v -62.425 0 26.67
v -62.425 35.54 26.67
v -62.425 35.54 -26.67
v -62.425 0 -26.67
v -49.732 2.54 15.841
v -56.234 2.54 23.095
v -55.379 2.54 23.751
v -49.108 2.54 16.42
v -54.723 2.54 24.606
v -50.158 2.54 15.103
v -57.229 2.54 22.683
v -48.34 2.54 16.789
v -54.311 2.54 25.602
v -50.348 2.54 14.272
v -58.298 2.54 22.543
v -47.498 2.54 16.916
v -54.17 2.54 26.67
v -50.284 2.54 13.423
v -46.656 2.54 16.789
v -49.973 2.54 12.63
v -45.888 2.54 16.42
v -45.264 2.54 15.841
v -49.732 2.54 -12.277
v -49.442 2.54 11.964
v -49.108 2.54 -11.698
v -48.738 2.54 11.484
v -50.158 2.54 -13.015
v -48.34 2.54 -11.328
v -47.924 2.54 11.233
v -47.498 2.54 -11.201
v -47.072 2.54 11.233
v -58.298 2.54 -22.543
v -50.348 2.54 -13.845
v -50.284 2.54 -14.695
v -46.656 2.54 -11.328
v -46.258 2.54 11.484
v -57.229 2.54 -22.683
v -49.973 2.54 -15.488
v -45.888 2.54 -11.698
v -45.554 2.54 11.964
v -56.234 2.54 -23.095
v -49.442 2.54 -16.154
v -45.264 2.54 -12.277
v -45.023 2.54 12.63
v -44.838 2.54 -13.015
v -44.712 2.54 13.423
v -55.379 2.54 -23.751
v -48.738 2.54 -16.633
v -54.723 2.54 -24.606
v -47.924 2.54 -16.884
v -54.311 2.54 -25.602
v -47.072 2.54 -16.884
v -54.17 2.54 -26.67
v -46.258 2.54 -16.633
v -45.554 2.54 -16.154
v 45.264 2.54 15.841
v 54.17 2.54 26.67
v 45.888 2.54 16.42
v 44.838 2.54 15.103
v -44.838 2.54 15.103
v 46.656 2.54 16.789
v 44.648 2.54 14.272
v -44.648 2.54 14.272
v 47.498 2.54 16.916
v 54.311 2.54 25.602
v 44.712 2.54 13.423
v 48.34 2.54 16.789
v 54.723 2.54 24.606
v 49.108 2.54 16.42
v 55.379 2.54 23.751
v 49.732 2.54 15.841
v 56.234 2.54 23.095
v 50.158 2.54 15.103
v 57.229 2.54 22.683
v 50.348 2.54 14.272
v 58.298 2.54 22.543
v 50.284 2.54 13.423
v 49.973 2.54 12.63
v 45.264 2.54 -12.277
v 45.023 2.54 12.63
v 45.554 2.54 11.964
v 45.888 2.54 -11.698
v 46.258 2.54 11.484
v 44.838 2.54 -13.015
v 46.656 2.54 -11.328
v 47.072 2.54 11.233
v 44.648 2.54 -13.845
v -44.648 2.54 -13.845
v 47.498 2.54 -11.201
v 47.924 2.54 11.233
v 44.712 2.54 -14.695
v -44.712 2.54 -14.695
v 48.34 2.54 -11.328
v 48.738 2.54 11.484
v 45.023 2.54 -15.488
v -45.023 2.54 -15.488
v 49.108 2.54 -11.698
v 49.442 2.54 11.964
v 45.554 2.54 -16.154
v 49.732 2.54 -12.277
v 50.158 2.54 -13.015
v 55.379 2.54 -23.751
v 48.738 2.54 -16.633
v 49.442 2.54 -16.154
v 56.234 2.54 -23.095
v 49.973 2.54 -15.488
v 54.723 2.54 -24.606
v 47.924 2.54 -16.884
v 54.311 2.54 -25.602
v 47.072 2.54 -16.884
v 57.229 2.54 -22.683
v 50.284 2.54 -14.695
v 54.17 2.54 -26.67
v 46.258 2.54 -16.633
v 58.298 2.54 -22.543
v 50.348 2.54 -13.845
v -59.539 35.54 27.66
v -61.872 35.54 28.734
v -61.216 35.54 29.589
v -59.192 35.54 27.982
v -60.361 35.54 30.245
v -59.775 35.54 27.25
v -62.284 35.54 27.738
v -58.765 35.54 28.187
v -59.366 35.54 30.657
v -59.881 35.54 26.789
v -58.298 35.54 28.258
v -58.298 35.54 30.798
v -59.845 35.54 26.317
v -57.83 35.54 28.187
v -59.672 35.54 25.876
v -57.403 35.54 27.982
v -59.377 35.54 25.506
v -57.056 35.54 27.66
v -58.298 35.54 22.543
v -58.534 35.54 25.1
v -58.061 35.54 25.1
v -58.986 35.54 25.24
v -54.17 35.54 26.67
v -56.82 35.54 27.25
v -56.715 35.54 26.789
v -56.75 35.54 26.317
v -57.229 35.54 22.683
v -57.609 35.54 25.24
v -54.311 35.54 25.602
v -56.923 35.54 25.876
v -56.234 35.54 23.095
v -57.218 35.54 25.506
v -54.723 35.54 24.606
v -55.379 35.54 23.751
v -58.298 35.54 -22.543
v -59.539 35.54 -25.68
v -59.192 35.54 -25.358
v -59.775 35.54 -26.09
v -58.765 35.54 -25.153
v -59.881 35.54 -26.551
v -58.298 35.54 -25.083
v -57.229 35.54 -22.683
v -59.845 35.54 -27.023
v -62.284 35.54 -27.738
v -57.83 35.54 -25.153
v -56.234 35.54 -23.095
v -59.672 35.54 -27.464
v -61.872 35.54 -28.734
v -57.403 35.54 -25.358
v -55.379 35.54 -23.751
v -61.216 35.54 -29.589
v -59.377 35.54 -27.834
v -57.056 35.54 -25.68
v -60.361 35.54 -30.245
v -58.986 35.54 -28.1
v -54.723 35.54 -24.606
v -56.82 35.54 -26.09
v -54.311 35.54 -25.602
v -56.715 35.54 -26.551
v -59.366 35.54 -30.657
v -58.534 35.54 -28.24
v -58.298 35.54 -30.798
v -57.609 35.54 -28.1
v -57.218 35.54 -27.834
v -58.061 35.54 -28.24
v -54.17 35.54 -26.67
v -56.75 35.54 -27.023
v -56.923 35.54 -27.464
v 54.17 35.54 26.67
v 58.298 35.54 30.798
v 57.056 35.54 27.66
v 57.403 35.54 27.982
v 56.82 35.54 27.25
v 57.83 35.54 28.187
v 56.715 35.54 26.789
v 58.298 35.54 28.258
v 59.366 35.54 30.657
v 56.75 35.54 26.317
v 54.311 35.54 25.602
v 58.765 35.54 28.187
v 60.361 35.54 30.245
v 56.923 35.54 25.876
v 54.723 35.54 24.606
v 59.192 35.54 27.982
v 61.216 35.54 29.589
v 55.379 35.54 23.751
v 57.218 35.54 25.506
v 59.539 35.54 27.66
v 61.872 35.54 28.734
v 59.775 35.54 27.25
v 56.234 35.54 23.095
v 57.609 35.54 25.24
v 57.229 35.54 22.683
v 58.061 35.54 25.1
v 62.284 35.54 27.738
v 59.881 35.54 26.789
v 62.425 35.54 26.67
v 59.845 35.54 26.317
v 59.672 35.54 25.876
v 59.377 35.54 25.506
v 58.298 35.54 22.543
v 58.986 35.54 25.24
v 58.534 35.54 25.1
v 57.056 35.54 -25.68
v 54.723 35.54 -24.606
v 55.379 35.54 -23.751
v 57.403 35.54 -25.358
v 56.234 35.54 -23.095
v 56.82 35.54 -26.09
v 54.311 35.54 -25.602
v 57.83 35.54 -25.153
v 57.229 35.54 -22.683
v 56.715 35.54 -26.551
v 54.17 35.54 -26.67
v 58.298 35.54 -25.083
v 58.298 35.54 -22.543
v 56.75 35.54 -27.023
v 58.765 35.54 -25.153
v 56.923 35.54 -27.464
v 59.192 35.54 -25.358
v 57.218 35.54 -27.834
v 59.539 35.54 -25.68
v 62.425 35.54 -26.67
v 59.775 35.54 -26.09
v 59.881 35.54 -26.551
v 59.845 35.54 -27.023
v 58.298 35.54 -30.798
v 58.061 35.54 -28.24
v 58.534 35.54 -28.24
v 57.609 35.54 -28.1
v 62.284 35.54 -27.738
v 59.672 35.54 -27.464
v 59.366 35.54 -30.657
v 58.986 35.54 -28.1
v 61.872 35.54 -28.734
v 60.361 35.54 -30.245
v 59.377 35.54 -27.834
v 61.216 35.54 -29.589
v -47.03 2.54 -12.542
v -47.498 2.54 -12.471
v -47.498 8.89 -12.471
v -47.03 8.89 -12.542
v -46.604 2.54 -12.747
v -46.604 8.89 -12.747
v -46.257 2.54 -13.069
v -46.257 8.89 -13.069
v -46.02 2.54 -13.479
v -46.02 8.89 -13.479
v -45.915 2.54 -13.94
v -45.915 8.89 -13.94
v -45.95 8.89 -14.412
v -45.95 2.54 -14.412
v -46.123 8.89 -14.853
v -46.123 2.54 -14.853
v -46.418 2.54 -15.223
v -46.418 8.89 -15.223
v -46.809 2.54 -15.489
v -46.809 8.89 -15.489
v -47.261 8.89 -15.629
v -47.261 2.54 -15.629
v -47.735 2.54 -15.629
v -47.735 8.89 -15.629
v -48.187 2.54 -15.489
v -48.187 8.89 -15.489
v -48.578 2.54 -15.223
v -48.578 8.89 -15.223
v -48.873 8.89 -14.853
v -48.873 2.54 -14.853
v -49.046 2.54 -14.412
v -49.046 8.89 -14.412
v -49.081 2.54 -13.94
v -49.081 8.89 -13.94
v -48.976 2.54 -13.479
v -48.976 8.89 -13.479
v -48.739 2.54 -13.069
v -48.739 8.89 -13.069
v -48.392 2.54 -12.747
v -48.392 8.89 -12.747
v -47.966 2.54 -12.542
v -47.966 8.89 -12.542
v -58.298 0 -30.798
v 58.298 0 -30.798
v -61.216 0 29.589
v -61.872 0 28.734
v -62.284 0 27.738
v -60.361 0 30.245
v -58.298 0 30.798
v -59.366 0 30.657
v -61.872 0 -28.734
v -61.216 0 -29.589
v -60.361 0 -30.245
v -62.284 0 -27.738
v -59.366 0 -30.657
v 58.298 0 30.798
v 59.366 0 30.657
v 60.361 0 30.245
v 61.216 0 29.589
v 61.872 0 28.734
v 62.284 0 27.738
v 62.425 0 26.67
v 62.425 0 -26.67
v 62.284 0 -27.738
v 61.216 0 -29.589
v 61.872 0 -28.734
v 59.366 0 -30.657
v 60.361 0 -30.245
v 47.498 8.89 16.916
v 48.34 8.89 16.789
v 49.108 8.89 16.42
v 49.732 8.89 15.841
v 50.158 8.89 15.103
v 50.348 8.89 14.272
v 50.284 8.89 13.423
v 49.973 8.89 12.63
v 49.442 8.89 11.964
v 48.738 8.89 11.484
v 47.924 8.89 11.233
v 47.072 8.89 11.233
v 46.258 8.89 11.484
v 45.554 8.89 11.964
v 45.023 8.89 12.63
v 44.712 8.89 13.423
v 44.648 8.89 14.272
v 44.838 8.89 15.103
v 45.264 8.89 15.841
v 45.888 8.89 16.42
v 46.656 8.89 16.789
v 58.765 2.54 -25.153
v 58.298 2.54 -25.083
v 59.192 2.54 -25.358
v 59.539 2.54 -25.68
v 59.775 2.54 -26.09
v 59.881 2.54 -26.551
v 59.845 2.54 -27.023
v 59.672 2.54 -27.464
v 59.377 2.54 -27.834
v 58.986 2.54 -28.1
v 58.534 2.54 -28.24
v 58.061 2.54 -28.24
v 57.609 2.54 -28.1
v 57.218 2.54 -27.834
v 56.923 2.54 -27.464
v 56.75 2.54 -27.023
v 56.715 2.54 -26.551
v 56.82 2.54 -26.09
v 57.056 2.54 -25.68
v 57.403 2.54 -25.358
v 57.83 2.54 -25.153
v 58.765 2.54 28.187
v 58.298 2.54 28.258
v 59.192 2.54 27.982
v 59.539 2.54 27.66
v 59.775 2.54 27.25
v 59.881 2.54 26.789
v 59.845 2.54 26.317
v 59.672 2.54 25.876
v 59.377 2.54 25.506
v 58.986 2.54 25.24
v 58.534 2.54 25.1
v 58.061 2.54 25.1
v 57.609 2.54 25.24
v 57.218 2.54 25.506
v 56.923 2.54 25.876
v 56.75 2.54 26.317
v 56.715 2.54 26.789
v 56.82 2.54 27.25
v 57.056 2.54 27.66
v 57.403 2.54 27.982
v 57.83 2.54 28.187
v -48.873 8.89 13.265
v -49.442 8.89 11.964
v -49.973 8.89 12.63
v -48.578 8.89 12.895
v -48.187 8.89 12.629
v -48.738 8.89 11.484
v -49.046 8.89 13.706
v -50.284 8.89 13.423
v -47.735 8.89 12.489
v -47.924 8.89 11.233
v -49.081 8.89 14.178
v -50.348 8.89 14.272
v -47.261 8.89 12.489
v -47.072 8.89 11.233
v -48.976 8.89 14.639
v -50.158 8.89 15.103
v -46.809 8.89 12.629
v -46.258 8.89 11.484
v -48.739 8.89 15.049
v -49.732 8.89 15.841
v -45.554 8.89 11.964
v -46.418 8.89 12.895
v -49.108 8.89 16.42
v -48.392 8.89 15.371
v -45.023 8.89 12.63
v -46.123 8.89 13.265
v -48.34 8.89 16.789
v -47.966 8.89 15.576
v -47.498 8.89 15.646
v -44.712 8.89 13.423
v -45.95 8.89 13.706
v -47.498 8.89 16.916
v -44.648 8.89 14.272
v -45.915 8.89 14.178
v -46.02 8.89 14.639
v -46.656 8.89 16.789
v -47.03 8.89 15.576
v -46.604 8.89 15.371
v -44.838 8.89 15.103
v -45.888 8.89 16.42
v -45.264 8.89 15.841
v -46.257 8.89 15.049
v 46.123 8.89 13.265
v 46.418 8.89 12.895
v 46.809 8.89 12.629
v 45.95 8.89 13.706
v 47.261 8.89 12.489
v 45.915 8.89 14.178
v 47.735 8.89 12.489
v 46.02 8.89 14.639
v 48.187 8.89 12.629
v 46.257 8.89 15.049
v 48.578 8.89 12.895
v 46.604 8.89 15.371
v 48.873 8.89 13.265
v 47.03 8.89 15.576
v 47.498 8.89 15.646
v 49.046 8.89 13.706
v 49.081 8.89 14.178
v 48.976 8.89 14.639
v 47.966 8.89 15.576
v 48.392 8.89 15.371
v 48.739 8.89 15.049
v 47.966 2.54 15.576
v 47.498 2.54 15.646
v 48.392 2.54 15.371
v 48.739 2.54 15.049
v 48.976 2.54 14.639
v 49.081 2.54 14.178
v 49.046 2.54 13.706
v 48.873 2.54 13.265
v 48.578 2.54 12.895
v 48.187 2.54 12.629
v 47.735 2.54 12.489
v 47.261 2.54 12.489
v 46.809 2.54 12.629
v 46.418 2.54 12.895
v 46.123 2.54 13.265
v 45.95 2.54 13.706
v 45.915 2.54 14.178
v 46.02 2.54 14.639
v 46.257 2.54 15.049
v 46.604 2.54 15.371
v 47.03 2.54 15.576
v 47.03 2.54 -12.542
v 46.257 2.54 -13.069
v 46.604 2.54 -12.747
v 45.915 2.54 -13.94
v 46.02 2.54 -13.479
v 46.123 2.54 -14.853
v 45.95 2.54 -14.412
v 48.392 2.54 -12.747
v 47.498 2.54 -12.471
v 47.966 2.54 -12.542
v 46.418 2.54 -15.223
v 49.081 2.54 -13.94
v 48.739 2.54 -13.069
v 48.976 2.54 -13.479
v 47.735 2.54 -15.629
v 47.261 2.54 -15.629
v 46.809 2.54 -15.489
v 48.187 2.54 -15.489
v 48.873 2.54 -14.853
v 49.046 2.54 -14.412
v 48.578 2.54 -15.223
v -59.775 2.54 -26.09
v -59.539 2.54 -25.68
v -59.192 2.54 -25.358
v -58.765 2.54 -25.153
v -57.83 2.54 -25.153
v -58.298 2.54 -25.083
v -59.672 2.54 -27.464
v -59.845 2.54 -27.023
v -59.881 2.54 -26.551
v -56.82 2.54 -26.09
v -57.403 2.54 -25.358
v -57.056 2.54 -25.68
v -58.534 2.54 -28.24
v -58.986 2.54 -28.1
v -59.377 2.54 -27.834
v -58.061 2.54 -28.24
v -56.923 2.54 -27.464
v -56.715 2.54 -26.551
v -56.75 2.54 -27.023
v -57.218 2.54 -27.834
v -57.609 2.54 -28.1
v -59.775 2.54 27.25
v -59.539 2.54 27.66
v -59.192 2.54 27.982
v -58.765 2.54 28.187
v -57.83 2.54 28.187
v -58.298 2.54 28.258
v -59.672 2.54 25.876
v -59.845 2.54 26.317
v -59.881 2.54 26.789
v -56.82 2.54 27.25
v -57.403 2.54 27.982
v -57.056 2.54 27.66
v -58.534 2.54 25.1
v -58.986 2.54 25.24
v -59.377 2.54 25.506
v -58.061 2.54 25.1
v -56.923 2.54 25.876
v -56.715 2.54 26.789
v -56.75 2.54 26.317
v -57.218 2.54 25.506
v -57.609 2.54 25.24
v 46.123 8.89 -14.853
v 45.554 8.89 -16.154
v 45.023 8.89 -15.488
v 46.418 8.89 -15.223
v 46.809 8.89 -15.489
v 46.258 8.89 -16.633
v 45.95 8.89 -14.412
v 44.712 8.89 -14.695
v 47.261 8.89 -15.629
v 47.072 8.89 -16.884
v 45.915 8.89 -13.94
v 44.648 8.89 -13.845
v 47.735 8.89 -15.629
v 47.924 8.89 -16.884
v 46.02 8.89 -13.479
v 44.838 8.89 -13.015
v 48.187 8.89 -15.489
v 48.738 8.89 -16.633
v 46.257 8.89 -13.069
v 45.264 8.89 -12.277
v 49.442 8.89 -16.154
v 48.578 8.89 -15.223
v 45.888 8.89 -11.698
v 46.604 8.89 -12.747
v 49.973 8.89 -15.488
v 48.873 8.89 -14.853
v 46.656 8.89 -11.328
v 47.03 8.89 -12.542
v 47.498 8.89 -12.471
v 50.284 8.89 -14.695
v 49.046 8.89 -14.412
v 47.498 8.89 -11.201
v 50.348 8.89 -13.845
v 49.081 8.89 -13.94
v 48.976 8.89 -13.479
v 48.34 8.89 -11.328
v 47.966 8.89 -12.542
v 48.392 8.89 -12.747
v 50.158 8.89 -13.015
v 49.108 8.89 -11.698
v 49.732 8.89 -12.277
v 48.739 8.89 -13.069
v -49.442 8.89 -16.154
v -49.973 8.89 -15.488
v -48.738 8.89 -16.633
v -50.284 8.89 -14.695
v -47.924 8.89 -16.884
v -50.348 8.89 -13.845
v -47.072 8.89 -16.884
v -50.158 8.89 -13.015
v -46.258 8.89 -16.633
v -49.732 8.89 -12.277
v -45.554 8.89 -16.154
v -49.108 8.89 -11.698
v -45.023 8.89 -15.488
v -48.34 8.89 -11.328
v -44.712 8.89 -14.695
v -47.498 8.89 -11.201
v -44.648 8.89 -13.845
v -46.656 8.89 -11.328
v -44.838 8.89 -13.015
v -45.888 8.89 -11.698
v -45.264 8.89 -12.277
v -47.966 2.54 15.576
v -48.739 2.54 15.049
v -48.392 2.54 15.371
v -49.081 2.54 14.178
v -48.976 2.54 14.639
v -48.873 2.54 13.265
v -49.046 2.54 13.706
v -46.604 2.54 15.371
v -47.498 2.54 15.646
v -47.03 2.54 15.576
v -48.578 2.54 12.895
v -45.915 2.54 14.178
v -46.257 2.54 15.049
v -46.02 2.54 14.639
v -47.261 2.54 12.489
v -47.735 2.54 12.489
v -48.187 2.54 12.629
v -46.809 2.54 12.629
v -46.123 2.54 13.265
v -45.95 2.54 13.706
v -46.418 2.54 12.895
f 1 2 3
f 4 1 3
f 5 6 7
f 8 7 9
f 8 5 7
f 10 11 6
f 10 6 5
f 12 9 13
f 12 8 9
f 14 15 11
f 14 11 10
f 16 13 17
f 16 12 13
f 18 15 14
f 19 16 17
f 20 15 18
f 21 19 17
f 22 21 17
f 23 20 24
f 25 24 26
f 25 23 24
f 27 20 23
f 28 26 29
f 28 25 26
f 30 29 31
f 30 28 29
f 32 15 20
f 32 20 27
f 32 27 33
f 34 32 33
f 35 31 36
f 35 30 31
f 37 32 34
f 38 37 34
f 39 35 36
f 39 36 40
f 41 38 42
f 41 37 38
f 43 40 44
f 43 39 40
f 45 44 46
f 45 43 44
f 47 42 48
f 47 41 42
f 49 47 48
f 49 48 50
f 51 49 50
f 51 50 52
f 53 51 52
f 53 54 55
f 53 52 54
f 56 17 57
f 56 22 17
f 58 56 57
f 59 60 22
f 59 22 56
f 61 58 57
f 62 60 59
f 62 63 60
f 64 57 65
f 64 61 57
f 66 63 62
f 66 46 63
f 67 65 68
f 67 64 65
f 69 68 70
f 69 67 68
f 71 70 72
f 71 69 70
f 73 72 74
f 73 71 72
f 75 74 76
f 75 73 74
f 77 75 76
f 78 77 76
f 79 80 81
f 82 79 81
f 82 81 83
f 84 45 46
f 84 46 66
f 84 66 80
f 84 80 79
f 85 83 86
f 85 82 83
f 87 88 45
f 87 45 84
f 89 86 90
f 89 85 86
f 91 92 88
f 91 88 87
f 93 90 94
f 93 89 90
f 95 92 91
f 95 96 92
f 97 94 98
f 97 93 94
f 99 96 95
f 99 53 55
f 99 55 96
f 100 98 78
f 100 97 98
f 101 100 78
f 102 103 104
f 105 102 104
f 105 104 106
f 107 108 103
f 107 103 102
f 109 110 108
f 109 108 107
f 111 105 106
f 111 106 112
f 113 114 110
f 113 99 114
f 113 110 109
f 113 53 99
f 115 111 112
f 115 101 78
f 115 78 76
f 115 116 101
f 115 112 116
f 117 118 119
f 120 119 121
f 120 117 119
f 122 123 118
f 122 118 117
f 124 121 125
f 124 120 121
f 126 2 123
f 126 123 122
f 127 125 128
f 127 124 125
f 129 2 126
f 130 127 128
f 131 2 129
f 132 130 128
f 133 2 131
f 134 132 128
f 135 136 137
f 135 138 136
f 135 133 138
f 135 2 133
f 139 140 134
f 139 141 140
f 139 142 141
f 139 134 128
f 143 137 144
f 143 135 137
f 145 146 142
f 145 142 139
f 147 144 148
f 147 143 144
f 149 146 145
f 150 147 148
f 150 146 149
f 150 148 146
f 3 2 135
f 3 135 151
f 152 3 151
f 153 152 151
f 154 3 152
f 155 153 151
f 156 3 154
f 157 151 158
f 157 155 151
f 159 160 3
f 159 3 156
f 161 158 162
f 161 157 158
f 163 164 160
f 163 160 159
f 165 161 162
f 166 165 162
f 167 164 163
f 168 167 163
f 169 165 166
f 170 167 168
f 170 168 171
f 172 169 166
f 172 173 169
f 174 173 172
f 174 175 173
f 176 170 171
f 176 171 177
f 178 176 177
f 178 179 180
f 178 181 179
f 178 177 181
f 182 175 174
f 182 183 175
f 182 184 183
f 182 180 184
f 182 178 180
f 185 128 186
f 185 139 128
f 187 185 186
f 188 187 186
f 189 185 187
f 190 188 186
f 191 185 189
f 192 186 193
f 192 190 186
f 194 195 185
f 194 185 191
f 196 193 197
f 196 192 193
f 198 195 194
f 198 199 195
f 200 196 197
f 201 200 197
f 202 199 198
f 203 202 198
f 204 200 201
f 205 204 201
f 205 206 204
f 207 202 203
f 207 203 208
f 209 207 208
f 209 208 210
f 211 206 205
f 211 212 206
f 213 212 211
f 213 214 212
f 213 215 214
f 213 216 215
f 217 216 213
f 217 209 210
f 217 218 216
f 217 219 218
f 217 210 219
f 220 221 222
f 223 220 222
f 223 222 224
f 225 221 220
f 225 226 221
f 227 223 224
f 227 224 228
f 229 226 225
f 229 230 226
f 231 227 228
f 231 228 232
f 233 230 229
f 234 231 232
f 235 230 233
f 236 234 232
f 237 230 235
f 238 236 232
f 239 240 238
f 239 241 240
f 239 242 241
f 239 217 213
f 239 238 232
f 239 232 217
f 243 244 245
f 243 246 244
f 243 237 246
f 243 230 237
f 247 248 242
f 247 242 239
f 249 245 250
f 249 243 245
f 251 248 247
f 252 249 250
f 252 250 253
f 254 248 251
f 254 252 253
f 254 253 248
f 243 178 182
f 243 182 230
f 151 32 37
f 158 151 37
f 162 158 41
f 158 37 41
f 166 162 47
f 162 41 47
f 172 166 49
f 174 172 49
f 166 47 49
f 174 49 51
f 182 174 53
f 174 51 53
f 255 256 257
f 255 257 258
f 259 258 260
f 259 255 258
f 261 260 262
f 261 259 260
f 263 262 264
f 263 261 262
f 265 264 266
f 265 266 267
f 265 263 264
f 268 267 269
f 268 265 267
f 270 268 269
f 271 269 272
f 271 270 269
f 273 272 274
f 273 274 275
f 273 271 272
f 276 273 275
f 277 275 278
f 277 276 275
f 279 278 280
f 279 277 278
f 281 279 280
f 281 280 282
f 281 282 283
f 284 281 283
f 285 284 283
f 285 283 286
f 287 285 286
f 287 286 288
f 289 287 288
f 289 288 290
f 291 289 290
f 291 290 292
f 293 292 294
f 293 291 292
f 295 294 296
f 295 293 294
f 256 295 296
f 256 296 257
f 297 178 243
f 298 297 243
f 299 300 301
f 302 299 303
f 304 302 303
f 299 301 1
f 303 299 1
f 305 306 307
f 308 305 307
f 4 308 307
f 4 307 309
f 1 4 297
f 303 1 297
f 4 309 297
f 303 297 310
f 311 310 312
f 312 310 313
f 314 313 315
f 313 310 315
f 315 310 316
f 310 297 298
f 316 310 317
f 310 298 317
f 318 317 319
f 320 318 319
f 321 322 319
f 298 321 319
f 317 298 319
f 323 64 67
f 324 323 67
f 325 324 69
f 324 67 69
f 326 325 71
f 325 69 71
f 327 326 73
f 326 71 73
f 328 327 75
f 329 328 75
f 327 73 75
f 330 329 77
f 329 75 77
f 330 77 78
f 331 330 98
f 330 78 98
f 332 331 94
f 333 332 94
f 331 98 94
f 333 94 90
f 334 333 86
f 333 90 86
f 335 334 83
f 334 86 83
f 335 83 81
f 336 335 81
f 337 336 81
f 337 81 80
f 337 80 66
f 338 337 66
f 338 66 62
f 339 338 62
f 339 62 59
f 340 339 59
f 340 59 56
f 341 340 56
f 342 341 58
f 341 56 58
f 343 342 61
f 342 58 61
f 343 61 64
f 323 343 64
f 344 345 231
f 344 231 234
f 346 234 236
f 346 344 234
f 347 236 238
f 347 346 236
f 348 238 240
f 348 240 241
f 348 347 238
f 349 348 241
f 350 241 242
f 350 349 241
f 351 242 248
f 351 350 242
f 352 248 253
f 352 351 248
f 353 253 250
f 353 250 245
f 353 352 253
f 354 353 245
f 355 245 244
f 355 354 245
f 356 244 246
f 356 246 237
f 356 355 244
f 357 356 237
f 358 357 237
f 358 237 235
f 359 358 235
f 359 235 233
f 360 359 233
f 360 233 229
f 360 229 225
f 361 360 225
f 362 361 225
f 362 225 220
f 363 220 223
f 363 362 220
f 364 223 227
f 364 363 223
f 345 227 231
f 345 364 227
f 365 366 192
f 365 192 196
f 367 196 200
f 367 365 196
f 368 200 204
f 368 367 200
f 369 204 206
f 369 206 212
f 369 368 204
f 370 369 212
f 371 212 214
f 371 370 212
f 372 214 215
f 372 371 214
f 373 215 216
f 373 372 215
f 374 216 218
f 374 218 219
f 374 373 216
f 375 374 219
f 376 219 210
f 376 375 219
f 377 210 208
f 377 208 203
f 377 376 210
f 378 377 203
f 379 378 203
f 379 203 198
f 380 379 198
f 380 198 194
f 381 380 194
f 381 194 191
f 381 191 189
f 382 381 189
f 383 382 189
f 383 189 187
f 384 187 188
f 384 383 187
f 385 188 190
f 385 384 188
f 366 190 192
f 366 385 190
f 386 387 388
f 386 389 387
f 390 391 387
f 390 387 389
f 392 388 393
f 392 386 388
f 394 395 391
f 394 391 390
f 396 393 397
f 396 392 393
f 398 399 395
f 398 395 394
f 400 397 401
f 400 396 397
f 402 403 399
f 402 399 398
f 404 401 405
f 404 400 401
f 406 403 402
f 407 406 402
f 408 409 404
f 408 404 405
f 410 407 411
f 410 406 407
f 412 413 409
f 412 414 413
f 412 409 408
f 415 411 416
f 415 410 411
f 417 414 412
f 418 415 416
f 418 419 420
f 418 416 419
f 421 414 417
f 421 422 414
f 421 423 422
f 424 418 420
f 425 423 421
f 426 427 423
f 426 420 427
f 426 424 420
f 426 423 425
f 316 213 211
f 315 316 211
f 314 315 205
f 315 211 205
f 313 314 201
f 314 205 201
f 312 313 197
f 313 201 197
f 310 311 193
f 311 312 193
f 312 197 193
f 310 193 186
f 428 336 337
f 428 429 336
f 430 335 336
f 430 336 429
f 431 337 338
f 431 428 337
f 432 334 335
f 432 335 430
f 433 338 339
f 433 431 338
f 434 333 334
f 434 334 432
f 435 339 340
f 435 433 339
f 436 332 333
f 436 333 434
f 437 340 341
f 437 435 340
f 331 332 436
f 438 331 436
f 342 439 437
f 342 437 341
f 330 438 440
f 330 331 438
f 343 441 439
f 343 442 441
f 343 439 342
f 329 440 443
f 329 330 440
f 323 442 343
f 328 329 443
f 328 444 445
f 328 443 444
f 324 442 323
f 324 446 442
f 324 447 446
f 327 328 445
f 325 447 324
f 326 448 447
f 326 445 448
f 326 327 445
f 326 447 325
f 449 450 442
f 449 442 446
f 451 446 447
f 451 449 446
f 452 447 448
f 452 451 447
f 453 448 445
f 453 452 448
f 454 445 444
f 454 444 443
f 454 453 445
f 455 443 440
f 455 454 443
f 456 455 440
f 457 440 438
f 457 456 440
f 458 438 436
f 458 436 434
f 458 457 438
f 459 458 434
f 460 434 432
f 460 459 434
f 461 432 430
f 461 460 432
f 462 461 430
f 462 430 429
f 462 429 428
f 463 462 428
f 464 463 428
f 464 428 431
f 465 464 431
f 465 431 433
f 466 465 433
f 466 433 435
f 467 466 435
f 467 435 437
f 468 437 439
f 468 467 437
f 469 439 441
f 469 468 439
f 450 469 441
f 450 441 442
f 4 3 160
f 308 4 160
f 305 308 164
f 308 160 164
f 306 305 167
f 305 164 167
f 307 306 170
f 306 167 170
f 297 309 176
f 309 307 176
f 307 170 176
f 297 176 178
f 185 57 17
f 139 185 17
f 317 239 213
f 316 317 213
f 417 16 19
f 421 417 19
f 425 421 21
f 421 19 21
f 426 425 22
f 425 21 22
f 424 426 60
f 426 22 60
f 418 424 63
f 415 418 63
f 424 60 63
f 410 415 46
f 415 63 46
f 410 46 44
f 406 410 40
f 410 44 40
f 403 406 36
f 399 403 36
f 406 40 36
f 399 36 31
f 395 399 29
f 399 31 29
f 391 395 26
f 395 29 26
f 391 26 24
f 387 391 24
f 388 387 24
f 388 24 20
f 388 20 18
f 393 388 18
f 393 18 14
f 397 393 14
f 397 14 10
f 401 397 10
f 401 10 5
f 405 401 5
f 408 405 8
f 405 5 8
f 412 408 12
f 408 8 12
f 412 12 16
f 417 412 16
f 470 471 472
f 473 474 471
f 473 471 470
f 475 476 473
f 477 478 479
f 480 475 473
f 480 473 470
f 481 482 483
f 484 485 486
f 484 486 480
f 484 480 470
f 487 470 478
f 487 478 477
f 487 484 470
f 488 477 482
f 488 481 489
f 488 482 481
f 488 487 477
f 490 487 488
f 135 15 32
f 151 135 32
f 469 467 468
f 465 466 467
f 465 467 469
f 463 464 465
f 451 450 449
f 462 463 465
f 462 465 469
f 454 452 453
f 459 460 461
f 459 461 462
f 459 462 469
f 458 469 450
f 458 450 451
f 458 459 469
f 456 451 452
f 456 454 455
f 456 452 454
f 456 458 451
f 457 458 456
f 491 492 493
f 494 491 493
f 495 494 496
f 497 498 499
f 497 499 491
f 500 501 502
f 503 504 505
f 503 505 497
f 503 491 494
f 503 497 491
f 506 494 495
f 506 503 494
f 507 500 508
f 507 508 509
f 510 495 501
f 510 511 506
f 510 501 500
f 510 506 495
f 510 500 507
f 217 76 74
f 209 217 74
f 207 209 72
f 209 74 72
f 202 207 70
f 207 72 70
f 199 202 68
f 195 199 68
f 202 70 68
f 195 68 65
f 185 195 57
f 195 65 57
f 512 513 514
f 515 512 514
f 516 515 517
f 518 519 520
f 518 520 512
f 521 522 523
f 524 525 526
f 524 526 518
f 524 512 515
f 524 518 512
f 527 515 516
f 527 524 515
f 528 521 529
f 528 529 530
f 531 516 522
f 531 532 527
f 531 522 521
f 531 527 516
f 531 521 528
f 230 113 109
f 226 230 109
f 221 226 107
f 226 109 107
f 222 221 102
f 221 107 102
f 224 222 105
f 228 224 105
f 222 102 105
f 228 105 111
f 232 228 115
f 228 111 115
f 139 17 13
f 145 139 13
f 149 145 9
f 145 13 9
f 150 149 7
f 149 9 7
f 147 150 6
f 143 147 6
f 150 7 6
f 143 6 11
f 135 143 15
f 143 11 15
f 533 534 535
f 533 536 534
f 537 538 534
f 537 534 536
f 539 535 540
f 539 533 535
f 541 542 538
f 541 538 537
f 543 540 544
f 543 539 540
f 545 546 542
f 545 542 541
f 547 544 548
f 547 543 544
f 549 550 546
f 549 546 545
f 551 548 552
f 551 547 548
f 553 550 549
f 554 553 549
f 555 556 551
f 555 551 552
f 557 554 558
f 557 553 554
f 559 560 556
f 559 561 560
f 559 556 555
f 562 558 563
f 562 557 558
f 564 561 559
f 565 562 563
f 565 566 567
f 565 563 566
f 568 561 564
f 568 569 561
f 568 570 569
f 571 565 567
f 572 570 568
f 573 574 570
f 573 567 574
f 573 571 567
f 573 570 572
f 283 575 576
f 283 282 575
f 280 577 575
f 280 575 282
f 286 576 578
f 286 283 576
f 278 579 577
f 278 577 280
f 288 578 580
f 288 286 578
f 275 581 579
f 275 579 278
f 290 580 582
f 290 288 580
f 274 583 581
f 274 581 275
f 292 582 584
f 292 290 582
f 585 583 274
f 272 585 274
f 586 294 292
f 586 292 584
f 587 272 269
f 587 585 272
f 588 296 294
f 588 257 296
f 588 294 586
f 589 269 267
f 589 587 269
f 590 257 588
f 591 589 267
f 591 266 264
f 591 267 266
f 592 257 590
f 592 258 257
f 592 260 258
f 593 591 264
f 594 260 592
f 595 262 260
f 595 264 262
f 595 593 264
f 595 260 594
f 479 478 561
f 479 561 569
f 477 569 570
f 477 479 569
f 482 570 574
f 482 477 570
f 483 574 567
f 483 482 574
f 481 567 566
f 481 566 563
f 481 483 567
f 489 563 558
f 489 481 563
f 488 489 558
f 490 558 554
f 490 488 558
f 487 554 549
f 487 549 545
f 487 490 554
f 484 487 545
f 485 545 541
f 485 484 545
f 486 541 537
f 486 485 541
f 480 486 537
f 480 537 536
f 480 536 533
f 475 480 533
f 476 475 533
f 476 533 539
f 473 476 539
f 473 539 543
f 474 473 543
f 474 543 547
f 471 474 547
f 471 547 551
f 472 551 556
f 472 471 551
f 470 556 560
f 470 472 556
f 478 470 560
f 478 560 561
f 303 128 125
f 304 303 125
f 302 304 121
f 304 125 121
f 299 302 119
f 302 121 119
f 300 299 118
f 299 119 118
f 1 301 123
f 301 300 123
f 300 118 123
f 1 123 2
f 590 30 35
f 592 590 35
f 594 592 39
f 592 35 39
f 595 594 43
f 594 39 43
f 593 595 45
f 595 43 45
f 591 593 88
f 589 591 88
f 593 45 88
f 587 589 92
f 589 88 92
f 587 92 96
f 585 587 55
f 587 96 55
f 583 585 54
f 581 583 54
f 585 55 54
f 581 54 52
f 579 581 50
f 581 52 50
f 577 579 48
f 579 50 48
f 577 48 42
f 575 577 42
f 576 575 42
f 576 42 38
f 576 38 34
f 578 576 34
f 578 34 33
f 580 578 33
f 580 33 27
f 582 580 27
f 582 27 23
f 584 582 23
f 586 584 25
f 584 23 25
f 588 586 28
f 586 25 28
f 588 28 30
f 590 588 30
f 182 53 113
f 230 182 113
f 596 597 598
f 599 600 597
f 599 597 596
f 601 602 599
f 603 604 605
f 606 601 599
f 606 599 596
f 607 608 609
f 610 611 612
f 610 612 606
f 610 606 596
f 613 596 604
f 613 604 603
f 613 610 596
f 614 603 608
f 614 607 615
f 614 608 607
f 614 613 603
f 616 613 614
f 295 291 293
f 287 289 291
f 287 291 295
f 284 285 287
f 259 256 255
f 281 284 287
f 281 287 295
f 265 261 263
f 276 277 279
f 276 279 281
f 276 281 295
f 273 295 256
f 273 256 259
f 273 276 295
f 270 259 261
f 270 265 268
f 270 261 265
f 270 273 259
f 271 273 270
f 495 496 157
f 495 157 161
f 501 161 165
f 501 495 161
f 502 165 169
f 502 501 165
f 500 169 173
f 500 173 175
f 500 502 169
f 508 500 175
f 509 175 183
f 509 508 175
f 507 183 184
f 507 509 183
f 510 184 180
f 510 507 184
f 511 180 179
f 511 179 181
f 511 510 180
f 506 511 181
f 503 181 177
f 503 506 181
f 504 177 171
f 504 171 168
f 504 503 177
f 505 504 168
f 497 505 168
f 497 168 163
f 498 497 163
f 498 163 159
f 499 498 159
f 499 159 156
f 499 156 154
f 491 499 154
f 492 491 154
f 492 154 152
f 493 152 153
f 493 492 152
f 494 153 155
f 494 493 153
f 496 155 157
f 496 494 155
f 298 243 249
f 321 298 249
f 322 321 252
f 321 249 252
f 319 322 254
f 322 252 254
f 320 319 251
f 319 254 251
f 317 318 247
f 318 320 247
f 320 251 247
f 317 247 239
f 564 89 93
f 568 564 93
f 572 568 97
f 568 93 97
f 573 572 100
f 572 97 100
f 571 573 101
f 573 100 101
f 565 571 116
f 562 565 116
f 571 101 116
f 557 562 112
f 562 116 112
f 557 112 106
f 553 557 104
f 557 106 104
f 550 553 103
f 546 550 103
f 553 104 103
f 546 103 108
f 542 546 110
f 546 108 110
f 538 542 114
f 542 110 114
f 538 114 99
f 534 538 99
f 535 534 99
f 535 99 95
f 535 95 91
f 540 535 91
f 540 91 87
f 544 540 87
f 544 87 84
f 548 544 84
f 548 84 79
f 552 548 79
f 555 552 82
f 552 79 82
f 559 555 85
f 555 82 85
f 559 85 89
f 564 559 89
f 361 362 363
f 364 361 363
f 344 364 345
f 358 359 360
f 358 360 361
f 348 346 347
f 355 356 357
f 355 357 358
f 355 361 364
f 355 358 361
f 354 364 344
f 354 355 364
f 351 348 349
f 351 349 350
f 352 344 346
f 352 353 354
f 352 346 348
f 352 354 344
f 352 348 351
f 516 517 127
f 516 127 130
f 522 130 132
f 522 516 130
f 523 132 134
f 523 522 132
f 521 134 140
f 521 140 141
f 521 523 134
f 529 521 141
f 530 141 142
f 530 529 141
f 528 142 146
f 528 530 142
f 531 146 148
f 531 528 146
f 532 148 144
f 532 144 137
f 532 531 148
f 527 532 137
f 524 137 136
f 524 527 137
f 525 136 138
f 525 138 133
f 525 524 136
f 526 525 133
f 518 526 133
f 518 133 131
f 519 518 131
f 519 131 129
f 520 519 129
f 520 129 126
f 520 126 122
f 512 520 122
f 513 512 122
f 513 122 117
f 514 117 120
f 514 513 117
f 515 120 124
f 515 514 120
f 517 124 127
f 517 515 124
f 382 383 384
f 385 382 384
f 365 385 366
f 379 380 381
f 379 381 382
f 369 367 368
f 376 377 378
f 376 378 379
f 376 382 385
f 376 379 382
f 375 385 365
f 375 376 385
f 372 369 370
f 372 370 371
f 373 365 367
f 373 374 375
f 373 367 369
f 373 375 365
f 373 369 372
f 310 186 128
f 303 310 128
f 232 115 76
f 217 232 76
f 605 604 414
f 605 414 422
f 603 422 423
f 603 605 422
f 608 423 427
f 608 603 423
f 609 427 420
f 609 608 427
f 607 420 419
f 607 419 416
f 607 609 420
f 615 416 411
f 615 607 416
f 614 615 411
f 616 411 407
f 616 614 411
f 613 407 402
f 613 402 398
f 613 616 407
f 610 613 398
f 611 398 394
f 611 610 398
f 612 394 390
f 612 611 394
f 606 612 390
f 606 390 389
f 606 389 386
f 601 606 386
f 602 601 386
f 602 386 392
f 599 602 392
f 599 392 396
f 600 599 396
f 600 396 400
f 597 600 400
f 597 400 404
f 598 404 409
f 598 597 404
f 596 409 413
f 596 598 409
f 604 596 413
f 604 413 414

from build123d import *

# Parameters (mm, degrees)
SKETCH1_W           = 126.755144
SKETCH1_H           = 63.5
BOSS_EXTRUDE1_DEPTH = 2.54
SKETCH2_R           = 1.5875
BOSS_EXTRUDE2_DEPTH = 33
SKETCH2_4_W         = 126.755144
SKETCH2_4_H         = 63.5
CUT_EXTRUDE1_DEPTH  = 79.190658858
SKETCH4_R           = 2.8575
SKETCH4_R_2         = 1.5875
BOSS_EXTRUDE3_DEPTH = 6.35


with BuildPart() as part:
    # Sketch1 → Boss-Extrude1 (new body)
    with BuildSketch(Plane(origin=(0, 0, 0), x_dir=(1, 0, 0), z_dir=(0, 1, 0))):
        Rectangle(SKETCH1_W, SKETCH1_H)
    extrude(amount=BOSS_EXTRUDE1_DEPTH)

    # Sketch2 → Boss-Extrude2 (add)
    with BuildSketch(Plane(origin=(0, 2.54, 0), x_dir=(1, 0, 0), z_dir=(0, 1, 0))):
        with BuildLine():
            ThreePointArc((62.425072, 26.67), (61.216155239, 29.588583239), (58.297572, 30.7975))
            Line((58.297572, 30.7975), (-58.297572, 30.7975))
            ThreePointArc((-58.297572, 30.7975), (-61.216155239, 29.588583239), (-62.425072, 26.67))
            Line((-62.425072, 26.67), (-62.425072, -26.67))
            ThreePointArc((-62.425072, -26.67), (-61.216155239, -29.588583239), (-58.297572, -30.7975))
            Line((-58.297572, -30.7975), (58.297572, -30.7975))
            ThreePointArc((58.297572, -30.7975), (61.216155239, -29.588583239), (62.425072, -26.67))
            Line((62.425072, -26.67), (62.425072, 26.67))
        make_face()
        with Locations((58.297572, 26.67)):
            Circle(SKETCH2_R, mode=Mode.SUBTRACT)
        with BuildLine():
            ThreePointArc((54.170072, 26.67), (55.378988761, 23.751416761), (58.297572, 22.5425))
            Line((58.297572, 22.5425), (58.297572, -22.5425))
            ThreePointArc((58.297572, -22.5425), (55.378988761, -23.751416761), (54.170072, -26.67))
            Line((54.170072, -26.67), (-54.170072, -26.67))
            ThreePointArc((-54.170072, -26.67), (-55.378988761, -23.751416761), (-58.297572, -22.5425))
            Line((-58.297572, -22.5425), (-58.297572, 22.5425))
            ThreePointArc((-58.297572, 22.5425), (-55.378988761, 23.751416761), (-54.170072, 26.67))
            Line((-54.170072, 26.67), (54.170072, 26.67))
        make_face(mode=Mode.SUBTRACT)
        with Locations((-58.297572, 26.67)):
            Circle(SKETCH2_R, mode=Mode.SUBTRACT)
        with Locations((58.297572, -26.67)):
            Circle(SKETCH2_R, mode=Mode.SUBTRACT)
        with Locations((-58.297572, -26.67)):
            Circle(SKETCH2_R, mode=Mode.SUBTRACT)
    extrude(amount=BOSS_EXTRUDE2_DEPTH)

    # Sketch2<4> → Cut-Extrude1 (cut, through all)
    with BuildSketch(Plane(origin=(0, 2.54, 0), x_dir=(1, 0, 0), z_dir=(0, 1, 0))):
        Rectangle(SKETCH2_4_W, SKETCH2_4_H)
        with BuildLine():
            ThreePointArc((58.297572, 30.7975), (61.216155239, 29.588583239), (62.425072, 26.67))
            Line((62.425072, 26.67), (62.425072, -26.67))
            ThreePointArc((62.425072, -26.67), (61.216155239, -29.588583239), (58.297572, -30.7975))
            Line((58.297572, -30.7975), (-58.297572, -30.7975))
            ThreePointArc((-58.297572, -30.7975), (-61.216155239, -29.588583239), (-62.425072, -26.67))
            Line((-62.425072, -26.67), (-62.425072, 26.67))
            ThreePointArc((-62.425072, 26.67), (-61.216155239, 29.588583239), (-58.297572, 30.7975))
            Line((-58.297572, 30.7975), (58.297572, 30.7975))
        make_face(mode=Mode.SUBTRACT)
    extrude(amount=-CUT_EXTRUDE1_DEPTH, mode=Mode.SUBTRACT)

    # Sketch4 → Boss-Extrude3 (add)
    # profile 1 of 4: a face of its own
    with BuildSketch(Plane(origin=(0, 2.54, 0), x_dir=(1, 0, 0), z_dir=(0, 1, 0))):
        with Locations((-47.498, 14.0589)):
            Circle(SKETCH4_R)
        with Locations((-47.498, 14.0589)):
            Circle(SKETCH4_R_2, mode=Mode.SUBTRACT)
    # profile 2 of 4: a face of its own
    with BuildSketch(Plane(origin=(0, 2.54, 0), x_dir=(1, 0, 0), z_dir=(0, 1, 0))):
        with Locations((-47.498, -14.0589)):
            Circle(SKETCH4_R)
        with Locations((-47.498, -14.0589)):
            Circle(SKETCH4_R_2, mode=Mode.SUBTRACT)
    # profile 3 of 4: a face of its own
    with BuildSketch(Plane(origin=(0, 2.54, 0), x_dir=(1, 0, 0), z_dir=(0, 1, 0))):
        with Locations((47.498, -14.0589)):
            Circle(SKETCH4_R)
        with Locations((47.498, -14.0589)):
            Circle(SKETCH4_R_2, mode=Mode.SUBTRACT)
    # profile 4 of 4: a face of its own
    with BuildSketch(Plane(origin=(0, 2.54, 0), x_dir=(1, 0, 0), z_dir=(0, 1, 0))):
        with Locations((47.498, 14.0589)):
            Circle(SKETCH4_R)
        with Locations((47.498, 14.0589)):
            Circle(SKETCH4_R_2, mode=Mode.SUBTRACT)
    extrude(amount=BOSS_EXTRUDE3_DEPTH)


solid = part.part
